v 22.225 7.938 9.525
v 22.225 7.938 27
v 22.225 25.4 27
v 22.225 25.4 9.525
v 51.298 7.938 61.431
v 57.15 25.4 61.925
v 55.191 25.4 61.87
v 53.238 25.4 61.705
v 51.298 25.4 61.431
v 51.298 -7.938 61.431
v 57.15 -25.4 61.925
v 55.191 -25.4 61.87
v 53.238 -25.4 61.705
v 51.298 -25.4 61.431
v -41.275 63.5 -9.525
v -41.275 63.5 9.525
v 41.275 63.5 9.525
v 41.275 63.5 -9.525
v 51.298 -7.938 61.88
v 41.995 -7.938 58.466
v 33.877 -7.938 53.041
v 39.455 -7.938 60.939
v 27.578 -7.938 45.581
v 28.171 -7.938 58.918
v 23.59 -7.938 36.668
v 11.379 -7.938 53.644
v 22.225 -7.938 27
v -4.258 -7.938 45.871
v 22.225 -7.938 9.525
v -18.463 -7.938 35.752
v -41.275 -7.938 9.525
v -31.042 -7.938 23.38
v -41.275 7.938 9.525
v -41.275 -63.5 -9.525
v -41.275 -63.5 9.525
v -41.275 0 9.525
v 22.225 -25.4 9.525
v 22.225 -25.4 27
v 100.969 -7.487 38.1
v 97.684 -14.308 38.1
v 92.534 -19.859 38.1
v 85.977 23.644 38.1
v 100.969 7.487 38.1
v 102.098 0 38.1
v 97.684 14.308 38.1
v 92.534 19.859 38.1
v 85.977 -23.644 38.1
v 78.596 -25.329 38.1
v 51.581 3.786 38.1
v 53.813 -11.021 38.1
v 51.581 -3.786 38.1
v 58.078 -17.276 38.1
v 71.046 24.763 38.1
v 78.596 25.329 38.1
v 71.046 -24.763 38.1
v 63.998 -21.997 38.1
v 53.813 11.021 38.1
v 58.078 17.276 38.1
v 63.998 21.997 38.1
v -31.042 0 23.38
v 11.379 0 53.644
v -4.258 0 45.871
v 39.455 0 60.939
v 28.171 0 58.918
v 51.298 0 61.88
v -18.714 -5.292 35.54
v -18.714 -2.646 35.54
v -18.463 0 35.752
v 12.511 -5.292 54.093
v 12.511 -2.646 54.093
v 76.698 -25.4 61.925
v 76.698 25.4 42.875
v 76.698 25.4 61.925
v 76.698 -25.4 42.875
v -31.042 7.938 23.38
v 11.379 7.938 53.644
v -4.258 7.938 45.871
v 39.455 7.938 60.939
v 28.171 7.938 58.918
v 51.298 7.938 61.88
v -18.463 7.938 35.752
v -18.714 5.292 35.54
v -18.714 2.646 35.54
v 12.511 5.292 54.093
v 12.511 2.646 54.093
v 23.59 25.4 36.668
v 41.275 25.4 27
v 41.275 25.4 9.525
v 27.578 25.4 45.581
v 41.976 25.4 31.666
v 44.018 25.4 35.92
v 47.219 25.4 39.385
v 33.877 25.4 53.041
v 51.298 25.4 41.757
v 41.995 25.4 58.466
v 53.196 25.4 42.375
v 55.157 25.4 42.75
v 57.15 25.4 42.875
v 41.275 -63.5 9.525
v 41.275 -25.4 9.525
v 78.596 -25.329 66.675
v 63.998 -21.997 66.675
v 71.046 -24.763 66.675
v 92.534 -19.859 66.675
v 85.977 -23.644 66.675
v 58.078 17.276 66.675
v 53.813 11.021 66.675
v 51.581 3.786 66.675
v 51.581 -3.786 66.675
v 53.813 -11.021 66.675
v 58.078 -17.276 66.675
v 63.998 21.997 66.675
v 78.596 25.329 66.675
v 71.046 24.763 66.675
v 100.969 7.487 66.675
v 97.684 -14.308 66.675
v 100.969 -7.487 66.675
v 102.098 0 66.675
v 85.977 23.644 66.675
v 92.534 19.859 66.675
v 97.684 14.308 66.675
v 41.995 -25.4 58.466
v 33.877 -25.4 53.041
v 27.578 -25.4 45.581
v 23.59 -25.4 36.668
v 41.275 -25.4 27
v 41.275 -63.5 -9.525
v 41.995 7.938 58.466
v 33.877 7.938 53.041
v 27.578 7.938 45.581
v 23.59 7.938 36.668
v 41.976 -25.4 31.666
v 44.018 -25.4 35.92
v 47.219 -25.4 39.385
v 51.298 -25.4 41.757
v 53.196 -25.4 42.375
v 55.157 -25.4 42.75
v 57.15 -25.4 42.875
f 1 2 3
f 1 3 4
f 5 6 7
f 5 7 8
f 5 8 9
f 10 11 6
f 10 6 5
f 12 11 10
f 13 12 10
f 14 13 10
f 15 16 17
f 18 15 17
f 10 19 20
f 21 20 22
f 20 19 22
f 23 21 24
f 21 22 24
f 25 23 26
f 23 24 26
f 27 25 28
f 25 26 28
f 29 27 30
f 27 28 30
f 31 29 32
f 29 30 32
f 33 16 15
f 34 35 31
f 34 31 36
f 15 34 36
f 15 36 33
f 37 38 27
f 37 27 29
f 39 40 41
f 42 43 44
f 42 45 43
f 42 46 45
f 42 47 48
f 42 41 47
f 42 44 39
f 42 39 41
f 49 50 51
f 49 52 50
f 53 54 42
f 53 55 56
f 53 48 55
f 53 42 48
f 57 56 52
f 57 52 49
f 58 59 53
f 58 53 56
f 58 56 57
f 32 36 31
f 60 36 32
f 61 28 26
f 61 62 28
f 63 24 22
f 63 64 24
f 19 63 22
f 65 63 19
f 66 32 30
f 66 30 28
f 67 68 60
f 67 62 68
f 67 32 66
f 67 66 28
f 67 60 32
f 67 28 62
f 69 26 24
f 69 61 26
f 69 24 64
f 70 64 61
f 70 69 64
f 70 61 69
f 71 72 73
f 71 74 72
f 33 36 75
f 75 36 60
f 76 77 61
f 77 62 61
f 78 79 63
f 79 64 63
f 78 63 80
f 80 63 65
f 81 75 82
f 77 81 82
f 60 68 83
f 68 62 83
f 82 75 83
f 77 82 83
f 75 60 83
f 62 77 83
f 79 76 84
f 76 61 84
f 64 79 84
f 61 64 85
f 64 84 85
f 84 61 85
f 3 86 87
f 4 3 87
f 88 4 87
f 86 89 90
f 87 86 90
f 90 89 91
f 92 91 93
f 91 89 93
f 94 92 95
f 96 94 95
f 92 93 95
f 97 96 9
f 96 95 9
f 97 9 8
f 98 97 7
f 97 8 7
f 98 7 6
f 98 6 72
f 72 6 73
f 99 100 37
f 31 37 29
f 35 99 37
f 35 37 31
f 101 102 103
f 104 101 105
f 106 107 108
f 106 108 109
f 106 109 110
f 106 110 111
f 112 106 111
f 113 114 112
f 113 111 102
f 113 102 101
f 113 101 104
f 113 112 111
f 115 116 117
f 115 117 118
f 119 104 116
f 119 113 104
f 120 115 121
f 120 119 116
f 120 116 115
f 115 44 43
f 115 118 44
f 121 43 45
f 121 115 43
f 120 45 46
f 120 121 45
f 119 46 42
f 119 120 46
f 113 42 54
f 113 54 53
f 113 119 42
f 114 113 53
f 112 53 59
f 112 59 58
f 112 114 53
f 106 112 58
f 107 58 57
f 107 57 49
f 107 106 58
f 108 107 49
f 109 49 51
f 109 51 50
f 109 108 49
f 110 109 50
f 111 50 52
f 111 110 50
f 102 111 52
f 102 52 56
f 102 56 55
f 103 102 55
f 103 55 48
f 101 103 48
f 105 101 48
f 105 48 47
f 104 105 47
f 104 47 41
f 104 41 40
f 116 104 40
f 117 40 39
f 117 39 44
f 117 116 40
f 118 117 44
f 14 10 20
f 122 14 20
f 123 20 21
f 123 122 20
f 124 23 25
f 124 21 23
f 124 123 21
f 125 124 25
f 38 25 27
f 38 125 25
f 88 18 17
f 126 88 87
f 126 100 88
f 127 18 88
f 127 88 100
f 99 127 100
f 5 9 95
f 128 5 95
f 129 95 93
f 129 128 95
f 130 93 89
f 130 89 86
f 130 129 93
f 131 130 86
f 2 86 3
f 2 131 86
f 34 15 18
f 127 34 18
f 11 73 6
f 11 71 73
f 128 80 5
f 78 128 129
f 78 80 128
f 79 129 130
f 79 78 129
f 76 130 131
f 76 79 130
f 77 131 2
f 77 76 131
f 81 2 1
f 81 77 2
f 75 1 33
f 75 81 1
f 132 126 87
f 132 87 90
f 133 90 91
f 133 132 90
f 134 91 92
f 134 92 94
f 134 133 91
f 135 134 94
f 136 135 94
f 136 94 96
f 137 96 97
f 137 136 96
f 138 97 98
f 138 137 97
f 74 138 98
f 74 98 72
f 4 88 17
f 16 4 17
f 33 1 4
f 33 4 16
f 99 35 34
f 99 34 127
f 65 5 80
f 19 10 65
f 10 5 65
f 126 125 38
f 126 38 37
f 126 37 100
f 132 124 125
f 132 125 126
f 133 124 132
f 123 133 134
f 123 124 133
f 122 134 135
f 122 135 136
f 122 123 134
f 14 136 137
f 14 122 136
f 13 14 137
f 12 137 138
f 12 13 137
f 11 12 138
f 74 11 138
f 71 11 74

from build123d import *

# Parameters (mm, degrees)
F1_DEPTH = 63.5
F2_DEPTH = 25.4
F3_DEPTH = 25.4
F4_DEPTH = 7.9375


with BuildPart() as f1:
    # F0 (on Front) → F1 (new body, symmetric)
    with BuildSketch(Plane.XZ):
        Polygon((22.225, 9.525), (-41.275, 9.525), (-41.275, -9.525), (41.275, -9.525), (41.275, 9.525), align=None)
    extrude(amount=F1_DEPTH, both=True)

    # F0 (on Front) → F2 (join, symmetric)
    with BuildSketch(Plane.XZ):
        with BuildLine():
            Line((22.225, 27.0002), (22.225, 9.525))
            Line((22.225, 9.525), (41.275, 9.525))
            Line((41.275, 9.525), (41.275, 27.0002))
            ThreePointArc((41.275, 27.0002), (44.017559, 35.919539), (51.297629, 41.757076))
            Line((51.297629, 41.757076), (51.297629, 61.431369))
            ThreePointArc((51.297629, 61.431369), (30.465269, 49.531973), (22.225, 27.0002))
        make_face()
    extrude(amount=F2_DEPTH, both=True)

    # F0 (on Front) → F3 (join, symmetric)
    with BuildSketch(Plane.XZ):
        with BuildLine():
            ThreePointArc((57.15, 61.9252), (54.213415, 61.801523), (51.297629, 61.431369))
            Line((51.297629, 61.431369), (51.297629, 41.757076))
            ThreePointArc((51.297629, 41.757076), (54.170887, 42.593164), (57.15, 42.8752))
            Line((57.15, 42.8752), (76.697629, 42.8752))
            Line((76.697629, 42.8752), (76.697629, 61.9252))
            Line((76.697629, 61.9252), (57.15, 61.9252))
        make_face()
    extrude(amount=F3_DEPTH, both=True)

    # F0 (on Front) → F4 (join, symmetric)
    with BuildSketch(Plane.XZ):
        with BuildLine():
            add(Edge.make_bspline(
                [(-41.275, 9.525), (-23.414847, 38.170467), (9.099145, 60.576714), (51.297629, 61.880228)],
                knots=[0, 0, 0, 0, 106.626147, 106.626147, 106.626147, 106.626147], degree=3))
            Line((-41.275, 9.525), (22.225, 9.525))
            Line((22.225, 9.525), (22.225, 27.0002))
            ThreePointArc((22.225, 27.0002), (30.465269, 49.531973), (51.297629, 61.431369))
            Line((51.297629, 61.431369), (51.297629, 61.880228))
        make_face()
    extrude(amount=F4_DEPTH, both=True)


with BuildPart() as f5:
    # F0 (on Front) → F5 (revolve)
    with BuildSketch(Plane.XZ):
        Polygon((102.097629, 66.675), (76.697629, 66.675), (76.697629, 61.9252), (76.697629, 42.8752), (76.697629, 38.1), (102.097629, 38.1), align=None)
    revolve(axis=Axis((76.697629, 0, 52.3875), (0, 0, 1)))


solid = Compound([f1.part, f5.part])
